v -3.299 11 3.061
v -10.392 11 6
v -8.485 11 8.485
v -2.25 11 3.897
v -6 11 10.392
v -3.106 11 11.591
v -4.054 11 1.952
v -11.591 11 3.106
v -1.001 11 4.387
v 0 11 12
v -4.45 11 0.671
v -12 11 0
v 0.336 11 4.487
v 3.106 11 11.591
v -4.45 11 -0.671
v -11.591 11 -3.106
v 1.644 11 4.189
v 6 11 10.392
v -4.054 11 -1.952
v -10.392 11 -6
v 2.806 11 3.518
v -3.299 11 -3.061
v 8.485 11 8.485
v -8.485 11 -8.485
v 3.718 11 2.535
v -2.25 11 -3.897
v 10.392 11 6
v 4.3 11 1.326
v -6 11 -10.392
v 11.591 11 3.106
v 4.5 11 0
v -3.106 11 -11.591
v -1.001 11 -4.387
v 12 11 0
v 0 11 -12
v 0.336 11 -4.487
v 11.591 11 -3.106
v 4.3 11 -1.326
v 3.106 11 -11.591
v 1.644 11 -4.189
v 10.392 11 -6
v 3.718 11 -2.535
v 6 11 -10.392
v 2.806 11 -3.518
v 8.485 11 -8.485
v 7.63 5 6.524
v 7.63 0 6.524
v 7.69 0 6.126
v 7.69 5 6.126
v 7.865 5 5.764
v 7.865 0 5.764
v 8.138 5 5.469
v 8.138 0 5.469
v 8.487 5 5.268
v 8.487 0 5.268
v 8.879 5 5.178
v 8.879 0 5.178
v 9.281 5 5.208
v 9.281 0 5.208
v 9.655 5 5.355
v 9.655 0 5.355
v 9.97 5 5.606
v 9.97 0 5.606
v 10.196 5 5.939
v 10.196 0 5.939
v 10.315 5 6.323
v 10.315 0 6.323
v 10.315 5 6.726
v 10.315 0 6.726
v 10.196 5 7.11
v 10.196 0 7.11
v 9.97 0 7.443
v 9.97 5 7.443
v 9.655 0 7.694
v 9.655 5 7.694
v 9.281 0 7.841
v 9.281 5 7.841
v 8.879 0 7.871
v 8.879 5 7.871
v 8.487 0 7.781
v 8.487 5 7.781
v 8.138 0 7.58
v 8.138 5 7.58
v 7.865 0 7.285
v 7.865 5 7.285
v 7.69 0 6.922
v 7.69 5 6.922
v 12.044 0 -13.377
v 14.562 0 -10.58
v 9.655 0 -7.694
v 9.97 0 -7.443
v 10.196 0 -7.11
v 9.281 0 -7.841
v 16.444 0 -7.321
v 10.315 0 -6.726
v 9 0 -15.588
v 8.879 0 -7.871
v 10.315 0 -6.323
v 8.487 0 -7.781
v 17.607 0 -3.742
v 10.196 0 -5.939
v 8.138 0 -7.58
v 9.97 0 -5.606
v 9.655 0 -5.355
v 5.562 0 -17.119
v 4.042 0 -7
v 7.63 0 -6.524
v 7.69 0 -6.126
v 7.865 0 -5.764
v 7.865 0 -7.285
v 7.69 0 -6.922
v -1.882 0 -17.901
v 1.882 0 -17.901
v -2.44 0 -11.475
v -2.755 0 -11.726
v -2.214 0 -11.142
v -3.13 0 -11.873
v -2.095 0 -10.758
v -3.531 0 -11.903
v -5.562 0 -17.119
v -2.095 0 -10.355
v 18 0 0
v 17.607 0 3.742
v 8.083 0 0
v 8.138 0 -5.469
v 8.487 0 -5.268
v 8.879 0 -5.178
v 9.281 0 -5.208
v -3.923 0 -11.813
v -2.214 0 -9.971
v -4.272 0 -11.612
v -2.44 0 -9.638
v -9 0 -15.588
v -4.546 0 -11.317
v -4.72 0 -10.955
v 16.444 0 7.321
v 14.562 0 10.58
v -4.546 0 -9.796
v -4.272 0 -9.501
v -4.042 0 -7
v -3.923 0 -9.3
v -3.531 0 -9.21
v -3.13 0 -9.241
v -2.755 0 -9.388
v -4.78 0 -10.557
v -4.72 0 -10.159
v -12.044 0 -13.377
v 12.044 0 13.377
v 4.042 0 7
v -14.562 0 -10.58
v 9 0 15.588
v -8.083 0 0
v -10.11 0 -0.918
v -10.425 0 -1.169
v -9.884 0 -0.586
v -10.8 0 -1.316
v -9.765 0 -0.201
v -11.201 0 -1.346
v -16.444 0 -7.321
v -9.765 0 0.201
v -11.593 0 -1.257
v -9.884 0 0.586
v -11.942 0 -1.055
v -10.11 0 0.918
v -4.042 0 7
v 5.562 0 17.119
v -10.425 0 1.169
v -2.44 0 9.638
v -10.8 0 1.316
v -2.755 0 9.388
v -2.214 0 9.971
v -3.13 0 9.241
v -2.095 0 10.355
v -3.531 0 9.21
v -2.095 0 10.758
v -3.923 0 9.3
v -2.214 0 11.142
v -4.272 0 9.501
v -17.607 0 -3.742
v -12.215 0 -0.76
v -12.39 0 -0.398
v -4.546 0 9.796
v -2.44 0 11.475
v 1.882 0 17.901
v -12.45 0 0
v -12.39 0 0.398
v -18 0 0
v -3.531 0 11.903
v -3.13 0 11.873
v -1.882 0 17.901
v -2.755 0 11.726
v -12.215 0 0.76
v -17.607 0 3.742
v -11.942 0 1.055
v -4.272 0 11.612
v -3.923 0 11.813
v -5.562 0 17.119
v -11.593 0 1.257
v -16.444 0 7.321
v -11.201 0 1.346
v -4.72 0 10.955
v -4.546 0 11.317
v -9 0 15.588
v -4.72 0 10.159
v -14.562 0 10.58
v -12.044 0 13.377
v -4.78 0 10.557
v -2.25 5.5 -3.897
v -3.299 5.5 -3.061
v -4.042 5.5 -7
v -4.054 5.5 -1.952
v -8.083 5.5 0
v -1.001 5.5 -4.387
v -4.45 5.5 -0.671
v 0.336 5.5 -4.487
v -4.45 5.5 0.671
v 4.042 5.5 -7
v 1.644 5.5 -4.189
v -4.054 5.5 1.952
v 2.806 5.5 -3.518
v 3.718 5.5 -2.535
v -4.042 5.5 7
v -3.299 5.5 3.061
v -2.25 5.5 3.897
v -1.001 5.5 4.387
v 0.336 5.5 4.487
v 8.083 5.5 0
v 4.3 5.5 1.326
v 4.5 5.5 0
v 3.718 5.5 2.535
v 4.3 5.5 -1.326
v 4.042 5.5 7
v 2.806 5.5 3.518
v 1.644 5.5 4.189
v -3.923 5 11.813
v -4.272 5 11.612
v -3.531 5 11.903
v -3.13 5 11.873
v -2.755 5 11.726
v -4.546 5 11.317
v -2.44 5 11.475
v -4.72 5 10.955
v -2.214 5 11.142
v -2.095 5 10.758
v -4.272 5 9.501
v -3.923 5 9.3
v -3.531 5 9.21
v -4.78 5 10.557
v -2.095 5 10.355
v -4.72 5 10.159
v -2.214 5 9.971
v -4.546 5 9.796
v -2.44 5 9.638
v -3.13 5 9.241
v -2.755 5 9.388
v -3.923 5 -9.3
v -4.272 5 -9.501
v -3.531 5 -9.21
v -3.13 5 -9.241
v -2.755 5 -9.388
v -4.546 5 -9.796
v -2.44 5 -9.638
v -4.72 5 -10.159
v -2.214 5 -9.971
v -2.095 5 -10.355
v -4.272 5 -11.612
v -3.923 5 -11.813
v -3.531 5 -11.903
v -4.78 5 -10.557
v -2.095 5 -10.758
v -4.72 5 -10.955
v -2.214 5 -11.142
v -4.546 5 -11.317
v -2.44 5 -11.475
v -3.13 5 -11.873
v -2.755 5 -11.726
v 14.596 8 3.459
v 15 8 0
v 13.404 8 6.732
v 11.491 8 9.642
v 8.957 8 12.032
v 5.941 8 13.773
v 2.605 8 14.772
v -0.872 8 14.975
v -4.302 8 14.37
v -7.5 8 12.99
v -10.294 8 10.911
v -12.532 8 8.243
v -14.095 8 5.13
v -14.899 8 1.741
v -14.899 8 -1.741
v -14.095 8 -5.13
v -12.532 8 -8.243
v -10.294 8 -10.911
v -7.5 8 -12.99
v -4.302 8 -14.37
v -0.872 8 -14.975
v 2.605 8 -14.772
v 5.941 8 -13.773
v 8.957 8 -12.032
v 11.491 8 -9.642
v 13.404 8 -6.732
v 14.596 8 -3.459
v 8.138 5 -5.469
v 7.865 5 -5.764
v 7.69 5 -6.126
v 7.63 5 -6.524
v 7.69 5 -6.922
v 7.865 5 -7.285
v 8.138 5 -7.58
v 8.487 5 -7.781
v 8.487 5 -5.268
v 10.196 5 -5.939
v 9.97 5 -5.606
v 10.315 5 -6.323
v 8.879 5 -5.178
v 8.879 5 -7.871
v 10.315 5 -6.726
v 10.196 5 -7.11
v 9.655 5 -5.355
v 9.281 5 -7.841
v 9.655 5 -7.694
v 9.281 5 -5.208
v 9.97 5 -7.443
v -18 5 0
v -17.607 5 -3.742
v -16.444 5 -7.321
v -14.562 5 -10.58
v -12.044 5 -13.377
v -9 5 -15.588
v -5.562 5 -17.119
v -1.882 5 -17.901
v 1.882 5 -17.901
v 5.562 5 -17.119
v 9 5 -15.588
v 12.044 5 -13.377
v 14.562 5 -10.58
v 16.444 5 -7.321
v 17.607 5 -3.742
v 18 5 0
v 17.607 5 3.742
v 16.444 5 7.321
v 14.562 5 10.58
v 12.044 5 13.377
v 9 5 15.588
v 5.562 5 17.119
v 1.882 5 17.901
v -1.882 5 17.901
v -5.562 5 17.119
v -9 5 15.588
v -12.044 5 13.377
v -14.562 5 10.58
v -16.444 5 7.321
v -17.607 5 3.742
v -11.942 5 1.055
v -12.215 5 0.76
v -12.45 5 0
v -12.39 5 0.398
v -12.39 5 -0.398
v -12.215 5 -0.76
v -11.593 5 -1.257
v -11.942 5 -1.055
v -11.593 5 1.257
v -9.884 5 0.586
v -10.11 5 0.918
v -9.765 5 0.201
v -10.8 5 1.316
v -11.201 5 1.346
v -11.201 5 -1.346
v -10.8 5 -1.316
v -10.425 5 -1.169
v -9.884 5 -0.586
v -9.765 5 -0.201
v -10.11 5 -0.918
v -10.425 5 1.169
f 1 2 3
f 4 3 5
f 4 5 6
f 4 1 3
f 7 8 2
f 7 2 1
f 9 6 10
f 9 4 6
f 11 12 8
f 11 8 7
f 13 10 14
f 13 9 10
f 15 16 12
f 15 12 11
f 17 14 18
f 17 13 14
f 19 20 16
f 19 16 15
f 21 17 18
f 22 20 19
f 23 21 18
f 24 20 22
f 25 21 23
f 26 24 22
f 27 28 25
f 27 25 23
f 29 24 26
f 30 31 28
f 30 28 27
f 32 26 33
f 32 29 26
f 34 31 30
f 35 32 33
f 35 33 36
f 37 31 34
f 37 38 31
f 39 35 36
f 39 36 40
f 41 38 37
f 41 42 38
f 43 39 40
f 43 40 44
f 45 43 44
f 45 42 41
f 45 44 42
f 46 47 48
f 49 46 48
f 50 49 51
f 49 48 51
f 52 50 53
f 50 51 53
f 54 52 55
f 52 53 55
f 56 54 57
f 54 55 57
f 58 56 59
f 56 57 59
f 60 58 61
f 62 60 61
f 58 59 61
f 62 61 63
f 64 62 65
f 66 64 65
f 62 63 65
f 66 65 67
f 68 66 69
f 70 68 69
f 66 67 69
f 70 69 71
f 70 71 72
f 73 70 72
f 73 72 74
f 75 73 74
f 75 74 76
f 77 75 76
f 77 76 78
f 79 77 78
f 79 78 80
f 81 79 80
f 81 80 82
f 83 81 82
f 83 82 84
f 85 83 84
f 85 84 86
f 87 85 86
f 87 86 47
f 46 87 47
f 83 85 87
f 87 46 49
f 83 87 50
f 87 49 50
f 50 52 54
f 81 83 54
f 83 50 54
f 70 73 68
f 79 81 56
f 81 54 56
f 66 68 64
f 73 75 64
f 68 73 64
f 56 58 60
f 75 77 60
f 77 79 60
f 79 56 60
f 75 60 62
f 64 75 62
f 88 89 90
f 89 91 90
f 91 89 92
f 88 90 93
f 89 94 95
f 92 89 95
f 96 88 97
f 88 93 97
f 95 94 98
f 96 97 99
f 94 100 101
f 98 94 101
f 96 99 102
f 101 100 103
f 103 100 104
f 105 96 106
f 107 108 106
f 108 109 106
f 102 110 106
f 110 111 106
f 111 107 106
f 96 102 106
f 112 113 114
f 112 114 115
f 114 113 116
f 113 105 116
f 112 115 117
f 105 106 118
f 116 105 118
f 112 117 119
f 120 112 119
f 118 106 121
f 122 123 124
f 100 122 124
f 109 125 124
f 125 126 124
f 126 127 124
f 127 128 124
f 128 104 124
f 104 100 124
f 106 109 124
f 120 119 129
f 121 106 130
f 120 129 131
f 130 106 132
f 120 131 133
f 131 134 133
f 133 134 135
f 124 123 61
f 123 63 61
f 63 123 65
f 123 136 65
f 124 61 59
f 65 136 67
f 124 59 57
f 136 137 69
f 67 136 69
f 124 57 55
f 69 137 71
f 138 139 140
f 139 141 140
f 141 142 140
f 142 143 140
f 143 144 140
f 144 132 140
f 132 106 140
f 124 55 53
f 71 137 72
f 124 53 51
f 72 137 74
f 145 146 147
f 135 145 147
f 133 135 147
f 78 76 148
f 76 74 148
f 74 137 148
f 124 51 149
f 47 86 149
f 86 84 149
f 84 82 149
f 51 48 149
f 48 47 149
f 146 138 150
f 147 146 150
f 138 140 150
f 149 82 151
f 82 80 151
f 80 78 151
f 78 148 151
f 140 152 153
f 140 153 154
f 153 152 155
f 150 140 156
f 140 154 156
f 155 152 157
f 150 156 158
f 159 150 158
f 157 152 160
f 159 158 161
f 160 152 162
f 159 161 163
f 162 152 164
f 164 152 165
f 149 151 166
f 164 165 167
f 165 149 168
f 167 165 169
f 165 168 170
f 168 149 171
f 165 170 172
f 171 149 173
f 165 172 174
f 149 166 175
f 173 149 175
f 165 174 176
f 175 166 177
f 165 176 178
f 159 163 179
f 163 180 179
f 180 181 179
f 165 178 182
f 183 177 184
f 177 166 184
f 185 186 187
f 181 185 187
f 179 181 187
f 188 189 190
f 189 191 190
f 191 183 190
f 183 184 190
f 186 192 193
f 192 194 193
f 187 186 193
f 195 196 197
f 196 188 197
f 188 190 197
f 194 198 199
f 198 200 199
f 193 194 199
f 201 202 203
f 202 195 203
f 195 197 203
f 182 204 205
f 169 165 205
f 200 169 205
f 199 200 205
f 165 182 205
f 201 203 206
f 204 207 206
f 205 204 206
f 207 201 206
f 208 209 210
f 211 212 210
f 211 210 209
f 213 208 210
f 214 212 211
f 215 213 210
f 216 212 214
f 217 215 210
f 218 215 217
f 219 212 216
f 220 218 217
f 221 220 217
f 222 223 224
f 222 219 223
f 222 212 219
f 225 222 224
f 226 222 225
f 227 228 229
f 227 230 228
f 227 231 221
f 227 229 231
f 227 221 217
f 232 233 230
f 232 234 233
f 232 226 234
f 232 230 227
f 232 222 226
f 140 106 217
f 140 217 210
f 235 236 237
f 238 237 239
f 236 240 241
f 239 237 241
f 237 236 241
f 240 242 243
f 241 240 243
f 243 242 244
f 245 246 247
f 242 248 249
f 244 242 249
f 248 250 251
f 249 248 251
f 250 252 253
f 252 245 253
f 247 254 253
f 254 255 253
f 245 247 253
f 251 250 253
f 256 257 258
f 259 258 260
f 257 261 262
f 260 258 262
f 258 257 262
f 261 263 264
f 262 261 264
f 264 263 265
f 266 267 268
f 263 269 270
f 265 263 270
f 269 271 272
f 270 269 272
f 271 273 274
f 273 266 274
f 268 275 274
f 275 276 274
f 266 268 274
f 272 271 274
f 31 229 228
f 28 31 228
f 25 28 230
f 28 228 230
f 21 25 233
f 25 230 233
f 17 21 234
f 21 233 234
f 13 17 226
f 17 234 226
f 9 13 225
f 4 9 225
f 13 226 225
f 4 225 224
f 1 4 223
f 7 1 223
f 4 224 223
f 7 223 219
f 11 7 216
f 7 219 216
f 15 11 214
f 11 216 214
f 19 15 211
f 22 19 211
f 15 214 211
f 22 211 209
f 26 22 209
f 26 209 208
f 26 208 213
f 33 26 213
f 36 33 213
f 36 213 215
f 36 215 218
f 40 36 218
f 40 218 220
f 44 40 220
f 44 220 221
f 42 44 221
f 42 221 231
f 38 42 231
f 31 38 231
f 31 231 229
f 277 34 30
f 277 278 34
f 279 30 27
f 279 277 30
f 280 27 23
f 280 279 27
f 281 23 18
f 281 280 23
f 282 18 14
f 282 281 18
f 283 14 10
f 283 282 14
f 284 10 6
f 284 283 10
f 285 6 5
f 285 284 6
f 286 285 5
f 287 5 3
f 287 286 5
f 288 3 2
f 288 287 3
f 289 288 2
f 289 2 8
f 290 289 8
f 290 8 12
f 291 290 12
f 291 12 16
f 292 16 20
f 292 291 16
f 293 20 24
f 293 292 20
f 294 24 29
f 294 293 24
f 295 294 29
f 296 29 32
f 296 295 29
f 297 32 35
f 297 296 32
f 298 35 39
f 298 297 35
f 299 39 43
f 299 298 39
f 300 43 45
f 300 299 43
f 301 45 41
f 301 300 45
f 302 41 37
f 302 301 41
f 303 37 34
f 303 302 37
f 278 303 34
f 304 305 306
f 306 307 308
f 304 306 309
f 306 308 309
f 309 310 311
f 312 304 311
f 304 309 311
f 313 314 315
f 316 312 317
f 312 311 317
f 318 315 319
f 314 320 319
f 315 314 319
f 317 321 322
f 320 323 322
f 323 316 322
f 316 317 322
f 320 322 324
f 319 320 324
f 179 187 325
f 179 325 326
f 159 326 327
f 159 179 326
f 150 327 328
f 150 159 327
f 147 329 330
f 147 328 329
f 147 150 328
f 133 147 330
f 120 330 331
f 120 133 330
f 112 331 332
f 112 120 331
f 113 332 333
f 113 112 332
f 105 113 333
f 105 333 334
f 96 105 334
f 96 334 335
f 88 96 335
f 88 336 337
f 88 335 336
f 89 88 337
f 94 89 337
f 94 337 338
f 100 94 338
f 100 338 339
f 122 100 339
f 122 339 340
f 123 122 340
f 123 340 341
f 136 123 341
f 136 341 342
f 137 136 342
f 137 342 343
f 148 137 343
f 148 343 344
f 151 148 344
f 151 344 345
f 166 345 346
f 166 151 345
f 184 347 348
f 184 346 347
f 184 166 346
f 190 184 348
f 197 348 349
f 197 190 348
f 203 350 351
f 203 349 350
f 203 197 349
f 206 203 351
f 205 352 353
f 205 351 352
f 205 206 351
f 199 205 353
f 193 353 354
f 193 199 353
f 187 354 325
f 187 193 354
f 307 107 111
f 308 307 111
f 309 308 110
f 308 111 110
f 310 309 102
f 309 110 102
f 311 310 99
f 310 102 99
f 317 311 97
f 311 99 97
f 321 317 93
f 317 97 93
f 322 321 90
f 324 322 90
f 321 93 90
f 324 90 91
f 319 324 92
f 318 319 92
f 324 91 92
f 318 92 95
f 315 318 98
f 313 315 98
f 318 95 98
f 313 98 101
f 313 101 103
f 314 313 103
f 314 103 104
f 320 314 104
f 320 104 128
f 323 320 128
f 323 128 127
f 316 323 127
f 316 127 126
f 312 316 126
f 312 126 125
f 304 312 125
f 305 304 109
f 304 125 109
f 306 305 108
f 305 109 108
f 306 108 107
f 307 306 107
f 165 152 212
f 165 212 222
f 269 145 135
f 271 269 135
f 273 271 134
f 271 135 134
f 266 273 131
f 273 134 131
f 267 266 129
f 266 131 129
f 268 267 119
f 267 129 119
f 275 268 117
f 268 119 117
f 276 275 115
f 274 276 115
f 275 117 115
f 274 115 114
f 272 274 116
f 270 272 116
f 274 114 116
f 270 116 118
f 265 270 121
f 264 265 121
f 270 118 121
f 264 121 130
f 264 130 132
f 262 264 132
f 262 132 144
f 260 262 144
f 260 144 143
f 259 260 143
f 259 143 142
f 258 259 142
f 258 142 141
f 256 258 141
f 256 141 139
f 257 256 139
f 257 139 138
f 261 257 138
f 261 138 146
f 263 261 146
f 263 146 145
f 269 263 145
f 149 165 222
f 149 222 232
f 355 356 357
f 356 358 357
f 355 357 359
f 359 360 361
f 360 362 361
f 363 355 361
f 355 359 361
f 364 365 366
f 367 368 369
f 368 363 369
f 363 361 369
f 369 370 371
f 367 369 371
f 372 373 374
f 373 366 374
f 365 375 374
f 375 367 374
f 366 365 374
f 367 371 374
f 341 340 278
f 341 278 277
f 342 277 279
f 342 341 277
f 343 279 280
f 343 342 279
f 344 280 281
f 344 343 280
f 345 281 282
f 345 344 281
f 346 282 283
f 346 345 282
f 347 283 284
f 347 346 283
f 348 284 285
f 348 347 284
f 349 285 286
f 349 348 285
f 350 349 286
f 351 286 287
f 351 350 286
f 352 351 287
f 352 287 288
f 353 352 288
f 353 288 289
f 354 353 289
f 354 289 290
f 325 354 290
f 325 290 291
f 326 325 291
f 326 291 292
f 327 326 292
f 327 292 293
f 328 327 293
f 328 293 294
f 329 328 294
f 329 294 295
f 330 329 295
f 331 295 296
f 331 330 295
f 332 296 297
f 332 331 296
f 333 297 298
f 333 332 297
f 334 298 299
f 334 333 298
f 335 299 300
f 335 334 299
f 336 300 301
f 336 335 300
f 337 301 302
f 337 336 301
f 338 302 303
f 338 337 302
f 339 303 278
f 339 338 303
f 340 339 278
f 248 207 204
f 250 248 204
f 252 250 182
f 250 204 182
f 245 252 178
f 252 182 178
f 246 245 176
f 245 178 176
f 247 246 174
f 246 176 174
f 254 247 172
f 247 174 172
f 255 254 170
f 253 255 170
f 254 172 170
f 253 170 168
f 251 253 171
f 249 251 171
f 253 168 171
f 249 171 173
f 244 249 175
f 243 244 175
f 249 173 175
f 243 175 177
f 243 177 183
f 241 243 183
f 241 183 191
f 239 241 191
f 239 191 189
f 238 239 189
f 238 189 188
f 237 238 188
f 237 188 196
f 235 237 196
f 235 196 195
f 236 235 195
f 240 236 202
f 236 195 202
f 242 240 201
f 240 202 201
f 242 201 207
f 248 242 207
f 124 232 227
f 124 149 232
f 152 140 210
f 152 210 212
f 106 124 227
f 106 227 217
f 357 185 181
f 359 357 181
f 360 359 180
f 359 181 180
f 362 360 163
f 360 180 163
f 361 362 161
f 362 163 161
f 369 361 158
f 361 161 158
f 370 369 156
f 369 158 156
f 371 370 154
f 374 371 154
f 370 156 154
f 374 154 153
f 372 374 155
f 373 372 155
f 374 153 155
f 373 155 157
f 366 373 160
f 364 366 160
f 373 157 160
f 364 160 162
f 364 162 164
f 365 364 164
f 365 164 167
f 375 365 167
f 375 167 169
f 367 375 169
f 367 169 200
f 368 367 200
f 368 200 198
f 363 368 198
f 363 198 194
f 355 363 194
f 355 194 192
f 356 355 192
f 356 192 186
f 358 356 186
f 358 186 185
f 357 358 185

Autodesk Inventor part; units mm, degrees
ref_plane "YZ Plane" through (0, 0, 0) normal (1, 0, 0) x (0, 1, 0)
ref_plane "XZ Plane" through (0, 0, 0) normal (0, 1, 0) x (-1, 0, 0)
ref_plane "XY Plane" through (0, 0, 0) normal (0, 0, 1) x (1, 0, 0)
sketch "Sketch1" plane through (0, 0, 0) normal (0, 1, 0) x (-1, 0, 0)
  circle A0 centre (0, 0) radius 18
  line L0 (10.3065, -1.0922) -> (4.2236, -9.4646)
  line L1 (2.1462, -10.1396) -> (-7.6962, -6.9416)
  line L2 (-8.9801, -5.1744) -> (-8.9801, 5.1744)
  line L3 (-7.6962, 6.9416) -> (2.1462, 10.1396)
  line L4 (4.2236, 9.4646) -> (10.3065, 1.0922)
  circle A1 centre (3.4301, 10.5567) radius 1.35
  circle A2 centre (11.1, 0) radius 1.35
  circle A3 centre (-8.9801, 6.5244) radius 1.35
  circle A4 centre (-8.9801, -6.5244) radius 1.35
  circle A5 centre (3.4301, -10.5567) radius 1.35
  arc A6 (11.0179, 1.3475) -> (4.6863, 10.0622) centre (0, 0) ccw
  arc A7 (4.6863, -10.0622) -> (11.0179, -1.3475) centre (0, 0) ccw
  arc A8 (-8.1216, -7.5663) -> (2.1232, -10.8951) centre (0, 0) ccw
  arc A9 (2.1232, 10.8951) -> (-8.1216, 7.5663) centre (0, 0) ccw
  arc A10 (-9.7057, 5.386) -> (-9.7057, -5.386) centre (0, 0) ccw
  dimension "d0" = 36
  dimension "d2" = 2.7
  dimension "d3" = 2.7
  dimension "d4" = 2.7
  dimension "d5" = 2.7
  dimension "d6" = 2.7
extrude "Extrusion1" add sketch "Sketch1" along normal blind 5 contours A0 | A2 A7 A5 L0 | L0 A5 L1 A4 L2 A3 L3 A1 L4 A2 | L4 A1 A6 A2 | A5 A8 A4 L1 | L3 A3 A9 A1 | A10 A3 L2 A4
sketch "Sketch2" plane through (0, 5, 0) normal (0, 1, 0) x (1, 0, 0)
  circle A0 centre (0, 0) radius 18 projected
  circle A1 centre (0, 0) radius 15
  point P0 (2.5, -14.7902)
  point P1 (2.5, 14.7902)
  dimension "d9" = 30
extrude "Extrusion2" add sketch "Sketch2" along normal blind 6 contours A1
sketch "Sketch3" plane through (0, 0, 0) normal (0, -1, 0) x (1, 0, 0)
  circle A0 centre (0, 0) radius 18 projected
  line L0 (-8.0829, 0) -> (-4.0415, 7)
  line L1 (-4.0415, 7) -> (4.0415, 7)
  line L2 (4.0415, 7) -> (8.0829, 0)
  line L3 (8.0829, 0) -> (4.0415, -7)
  line L4 (4.0415, -7) -> (-4.0415, -7)
  line L5 (-4.0415, -7) -> (-8.0829, 0)
  dimension "d23" = 14
extrude "Extrusion3" cut sketch "Sketch3" against normal blind 5.5 contours L0 L1 L2 L3 L4 L5
sketch "Sketch4" plane through (0, 5.5, 0) normal (0, -1, 0) x (1, 0, 0)
  circle A0 centre (0, 0) radius 4.5
  dimension "d26" = 9
extrude "Extrusion4" cut sketch "Sketch4" against normal blind 9
chamfer "Chamfer1" distance 3 angle 45 2 edges at (-15, 5, 0) (-15, 11, 0)
equation "\"BendRadius\" = Thickness"
equation "\"BendReliefWidth\" = Thickness"
equation "\"BendReliefDepth\" = 0.5 * Thickness"
equation "\"CornerReliefSize\" = 4 * Thickness"
equation "\"MinimumRemnant\" = 2 * Thickness"
equation "\"TransitionRadius\" = BendRadius"
equation "\"JacobiRadiusSize\" = BendRadius"
equation "\"GapSize\" = Thickness"
equation "\"Thickness\" = 0.5"
properties part number "motorSupportNew1"
